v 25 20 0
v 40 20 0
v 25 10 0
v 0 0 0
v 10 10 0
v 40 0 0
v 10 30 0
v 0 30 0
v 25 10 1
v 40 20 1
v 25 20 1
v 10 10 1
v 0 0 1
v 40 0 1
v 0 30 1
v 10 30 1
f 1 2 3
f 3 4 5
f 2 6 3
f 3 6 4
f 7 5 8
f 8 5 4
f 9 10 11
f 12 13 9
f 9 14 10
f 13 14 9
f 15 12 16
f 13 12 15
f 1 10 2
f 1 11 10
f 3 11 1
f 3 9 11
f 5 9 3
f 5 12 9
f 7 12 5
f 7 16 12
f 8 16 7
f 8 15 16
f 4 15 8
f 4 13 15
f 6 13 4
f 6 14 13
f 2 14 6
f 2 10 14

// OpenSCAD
// file: ../scad/shape_modifier_utils.scad
// Overlap used to break coincident faces in booleans. Subtracting a cut that lands
// exactly on a surface leaves zero-thickness geometry, which renders unpredictably and
// slices worse; every cut is extended by this much so the faces genuinely cross.
//
// A function rather than a variable: `use <...>` exports functions but not top-level
// variable assignments, and the sweep reaches these files through `use`. Twelve modules
// across four files each declared their own `eps = 0.01` before this existed.
function geometry_eps() = 0.01;

// Length for a *centred* cutting solid that must pass entirely through material of
// depth `extent`. A centred cut reaches half this each way, so the factor leaves 50%
// clearance beyond `extent` on both sides -- a cut that lands flush on a face produces
// a zero-thickness shell rather than a clean hole.
//
// Measured against the swept parameter space: the deepest thing any of these cuts must
// clear is one bulkhead_section, one bulkhead_thickness tall, so the margin is 0.5 *
// bulkhead_thickness everywhere and scales with the part. Interconnect bulkheads stack
// two sections, but each section's cuts are applied before stacking, so the stack is
// not what a cut has to span.
function through_cut(extent) = 3 * extent;

// Distance at which to place a mask vertex so it lies outside anything within `extent`
// of the origin. Used by the half-plane polygons that trim an octant down to its
// wedge, where the vertex position only has to be "far enough" to be off the part.
//
// Worst case across 412 valid combinations is 3.25 mm of clearance, at U=0.5 with 1 mm
// panel: the shape reaches panel_offset + panel_overlap = 6.75 mm while the mask sits
// at 10 mm. Positive everywhere, and the gap widens with U.
function mask_reach(extent) = 2 * extent;


module octant_to_full() {
    mirror_x() {
        mirror_y() {
            mirror_xy() {
                children();
            }
        }
    }
}

module mirror_x() {
    union() {
        children();
        mirror([-1,0,0]) {
            children();
        }
    }
    
}

module mirror_y() {
    union() {
        children();
        mirror([0,-1,0]) {
            children();
        }
    }
    
}

module mirror_xy() {
    union() {
        children();
        mirror([1,-1,0]) {
            children();
        }
    }
}

module corner_translate(unit_width, corner_radius) {
    translate([unit_width/2-corner_radius,unit_width/2-corner_radius,0]) {
        children();
    }
}

// Move an octant out to its corner, then mirror it into all four -- the standard way
// a bulkhead profile is built from the one octant that is actually drawn.
//
// Every `*_shape` wrapper in fuselage_bulkhead_geometry.scad had this same pair open-
// coded around its own `*_octant` call. The wrappers stay: they name the full shape as
// distinct from the octant, and they are what seven call sites across two files use.
// It is the repeated body that is worth removing, not the interface.
module octant_tiled(unit_width, corner_radius) {
    octant_to_full() {
        corner_translate(unit_width, corner_radius) {
            children();
        }
    }
}


// mask lower diagonal quadrant
module octant_mask(unit_width, corner_radius) {
    eps = geometry_eps();
    polygon([[corner_radius+eps,corner_radius],
            [corner_radius+eps,-unit_width/2-corner_radius],
            [-unit_width/2-corner_radius+eps,-unit_width/2-corner_radius]]);
}

// fillet inward
module fillet_inner(radius) {
    intersection() {
        offset(r = -radius) {
            // fillet outward as well to ensure we round off any inward fillet artifacts (from input boundaries that are closer than 2*radius)
            offset(r = 2*radius) {
                offset(r = -radius) {
                    children();
                }
            }
        }
        // guarantee that the resultant shape has not gone outside the boundaries of the input shape
        children();
    }
}

// fillet outward
module fillet_outer(radius) {
    union() {
        offset(r = -radius) {
            offset(r = radius) {
                children();
            }
        }
        // guarantee that the resultant shape has not erroded into the boundaries of teh input shape
        children();
    }
}
// main file
// Does Part::Offset2D reproduce OpenSCAD's offset(r=) and fillet_inner()?
//
// The bulkhead's web shape is built with `offset(r = -web_width)` and `fillet_inner(
// web_fillet_radius)`, and fillet_inner is itself three chained offsets plus an
// intersection. Everything downstream of that in the bulkhead depends on the two agreeing,
// so this isolates the question on a polygon with both convex and concave corners.
//
// Extruded 1 mm, so the reported volume is the area.
$fa=1;
$fs=0.1;

include <../scad/shape_modifier_utils.scad>

shrink = 3;
fillet = 2;

module test_shape() {
    polygon([[0, 0], [40, 0], [40, 20], [25, 20], [25, 10], [10, 10], [10, 30], [0, 30]]);
}

mode = 0;   // 0 = raw, 1 = offset only, 2 = offset + fillet_inner

linear_extrude(height = 1) {
    if (mode == 0) {
        test_shape();
    } else if (mode == 1) {
        offset(r = -shrink) { test_shape(); }
    } else if (mode == 2) {
        fillet_inner(fillet) { offset(r = -shrink) { test_shape(); } }
    } else if (mode == 3) {
        // fillet_inner step 1
        offset(r = -fillet) { offset(r = -shrink) { test_shape(); } }
    } else if (mode == 4) {
        // fillet_inner step 2
        offset(r = 2*fillet) { offset(r = -fillet) { offset(r = -shrink) { test_shape(); } } }
    } else if (mode == 5) {
        // fillet_inner step 3, before the intersection with the input
        offset(r = -fillet) { offset(r = 2*fillet) { offset(r = -fillet) {
            offset(r = -shrink) { test_shape(); } } } }
    }
}
